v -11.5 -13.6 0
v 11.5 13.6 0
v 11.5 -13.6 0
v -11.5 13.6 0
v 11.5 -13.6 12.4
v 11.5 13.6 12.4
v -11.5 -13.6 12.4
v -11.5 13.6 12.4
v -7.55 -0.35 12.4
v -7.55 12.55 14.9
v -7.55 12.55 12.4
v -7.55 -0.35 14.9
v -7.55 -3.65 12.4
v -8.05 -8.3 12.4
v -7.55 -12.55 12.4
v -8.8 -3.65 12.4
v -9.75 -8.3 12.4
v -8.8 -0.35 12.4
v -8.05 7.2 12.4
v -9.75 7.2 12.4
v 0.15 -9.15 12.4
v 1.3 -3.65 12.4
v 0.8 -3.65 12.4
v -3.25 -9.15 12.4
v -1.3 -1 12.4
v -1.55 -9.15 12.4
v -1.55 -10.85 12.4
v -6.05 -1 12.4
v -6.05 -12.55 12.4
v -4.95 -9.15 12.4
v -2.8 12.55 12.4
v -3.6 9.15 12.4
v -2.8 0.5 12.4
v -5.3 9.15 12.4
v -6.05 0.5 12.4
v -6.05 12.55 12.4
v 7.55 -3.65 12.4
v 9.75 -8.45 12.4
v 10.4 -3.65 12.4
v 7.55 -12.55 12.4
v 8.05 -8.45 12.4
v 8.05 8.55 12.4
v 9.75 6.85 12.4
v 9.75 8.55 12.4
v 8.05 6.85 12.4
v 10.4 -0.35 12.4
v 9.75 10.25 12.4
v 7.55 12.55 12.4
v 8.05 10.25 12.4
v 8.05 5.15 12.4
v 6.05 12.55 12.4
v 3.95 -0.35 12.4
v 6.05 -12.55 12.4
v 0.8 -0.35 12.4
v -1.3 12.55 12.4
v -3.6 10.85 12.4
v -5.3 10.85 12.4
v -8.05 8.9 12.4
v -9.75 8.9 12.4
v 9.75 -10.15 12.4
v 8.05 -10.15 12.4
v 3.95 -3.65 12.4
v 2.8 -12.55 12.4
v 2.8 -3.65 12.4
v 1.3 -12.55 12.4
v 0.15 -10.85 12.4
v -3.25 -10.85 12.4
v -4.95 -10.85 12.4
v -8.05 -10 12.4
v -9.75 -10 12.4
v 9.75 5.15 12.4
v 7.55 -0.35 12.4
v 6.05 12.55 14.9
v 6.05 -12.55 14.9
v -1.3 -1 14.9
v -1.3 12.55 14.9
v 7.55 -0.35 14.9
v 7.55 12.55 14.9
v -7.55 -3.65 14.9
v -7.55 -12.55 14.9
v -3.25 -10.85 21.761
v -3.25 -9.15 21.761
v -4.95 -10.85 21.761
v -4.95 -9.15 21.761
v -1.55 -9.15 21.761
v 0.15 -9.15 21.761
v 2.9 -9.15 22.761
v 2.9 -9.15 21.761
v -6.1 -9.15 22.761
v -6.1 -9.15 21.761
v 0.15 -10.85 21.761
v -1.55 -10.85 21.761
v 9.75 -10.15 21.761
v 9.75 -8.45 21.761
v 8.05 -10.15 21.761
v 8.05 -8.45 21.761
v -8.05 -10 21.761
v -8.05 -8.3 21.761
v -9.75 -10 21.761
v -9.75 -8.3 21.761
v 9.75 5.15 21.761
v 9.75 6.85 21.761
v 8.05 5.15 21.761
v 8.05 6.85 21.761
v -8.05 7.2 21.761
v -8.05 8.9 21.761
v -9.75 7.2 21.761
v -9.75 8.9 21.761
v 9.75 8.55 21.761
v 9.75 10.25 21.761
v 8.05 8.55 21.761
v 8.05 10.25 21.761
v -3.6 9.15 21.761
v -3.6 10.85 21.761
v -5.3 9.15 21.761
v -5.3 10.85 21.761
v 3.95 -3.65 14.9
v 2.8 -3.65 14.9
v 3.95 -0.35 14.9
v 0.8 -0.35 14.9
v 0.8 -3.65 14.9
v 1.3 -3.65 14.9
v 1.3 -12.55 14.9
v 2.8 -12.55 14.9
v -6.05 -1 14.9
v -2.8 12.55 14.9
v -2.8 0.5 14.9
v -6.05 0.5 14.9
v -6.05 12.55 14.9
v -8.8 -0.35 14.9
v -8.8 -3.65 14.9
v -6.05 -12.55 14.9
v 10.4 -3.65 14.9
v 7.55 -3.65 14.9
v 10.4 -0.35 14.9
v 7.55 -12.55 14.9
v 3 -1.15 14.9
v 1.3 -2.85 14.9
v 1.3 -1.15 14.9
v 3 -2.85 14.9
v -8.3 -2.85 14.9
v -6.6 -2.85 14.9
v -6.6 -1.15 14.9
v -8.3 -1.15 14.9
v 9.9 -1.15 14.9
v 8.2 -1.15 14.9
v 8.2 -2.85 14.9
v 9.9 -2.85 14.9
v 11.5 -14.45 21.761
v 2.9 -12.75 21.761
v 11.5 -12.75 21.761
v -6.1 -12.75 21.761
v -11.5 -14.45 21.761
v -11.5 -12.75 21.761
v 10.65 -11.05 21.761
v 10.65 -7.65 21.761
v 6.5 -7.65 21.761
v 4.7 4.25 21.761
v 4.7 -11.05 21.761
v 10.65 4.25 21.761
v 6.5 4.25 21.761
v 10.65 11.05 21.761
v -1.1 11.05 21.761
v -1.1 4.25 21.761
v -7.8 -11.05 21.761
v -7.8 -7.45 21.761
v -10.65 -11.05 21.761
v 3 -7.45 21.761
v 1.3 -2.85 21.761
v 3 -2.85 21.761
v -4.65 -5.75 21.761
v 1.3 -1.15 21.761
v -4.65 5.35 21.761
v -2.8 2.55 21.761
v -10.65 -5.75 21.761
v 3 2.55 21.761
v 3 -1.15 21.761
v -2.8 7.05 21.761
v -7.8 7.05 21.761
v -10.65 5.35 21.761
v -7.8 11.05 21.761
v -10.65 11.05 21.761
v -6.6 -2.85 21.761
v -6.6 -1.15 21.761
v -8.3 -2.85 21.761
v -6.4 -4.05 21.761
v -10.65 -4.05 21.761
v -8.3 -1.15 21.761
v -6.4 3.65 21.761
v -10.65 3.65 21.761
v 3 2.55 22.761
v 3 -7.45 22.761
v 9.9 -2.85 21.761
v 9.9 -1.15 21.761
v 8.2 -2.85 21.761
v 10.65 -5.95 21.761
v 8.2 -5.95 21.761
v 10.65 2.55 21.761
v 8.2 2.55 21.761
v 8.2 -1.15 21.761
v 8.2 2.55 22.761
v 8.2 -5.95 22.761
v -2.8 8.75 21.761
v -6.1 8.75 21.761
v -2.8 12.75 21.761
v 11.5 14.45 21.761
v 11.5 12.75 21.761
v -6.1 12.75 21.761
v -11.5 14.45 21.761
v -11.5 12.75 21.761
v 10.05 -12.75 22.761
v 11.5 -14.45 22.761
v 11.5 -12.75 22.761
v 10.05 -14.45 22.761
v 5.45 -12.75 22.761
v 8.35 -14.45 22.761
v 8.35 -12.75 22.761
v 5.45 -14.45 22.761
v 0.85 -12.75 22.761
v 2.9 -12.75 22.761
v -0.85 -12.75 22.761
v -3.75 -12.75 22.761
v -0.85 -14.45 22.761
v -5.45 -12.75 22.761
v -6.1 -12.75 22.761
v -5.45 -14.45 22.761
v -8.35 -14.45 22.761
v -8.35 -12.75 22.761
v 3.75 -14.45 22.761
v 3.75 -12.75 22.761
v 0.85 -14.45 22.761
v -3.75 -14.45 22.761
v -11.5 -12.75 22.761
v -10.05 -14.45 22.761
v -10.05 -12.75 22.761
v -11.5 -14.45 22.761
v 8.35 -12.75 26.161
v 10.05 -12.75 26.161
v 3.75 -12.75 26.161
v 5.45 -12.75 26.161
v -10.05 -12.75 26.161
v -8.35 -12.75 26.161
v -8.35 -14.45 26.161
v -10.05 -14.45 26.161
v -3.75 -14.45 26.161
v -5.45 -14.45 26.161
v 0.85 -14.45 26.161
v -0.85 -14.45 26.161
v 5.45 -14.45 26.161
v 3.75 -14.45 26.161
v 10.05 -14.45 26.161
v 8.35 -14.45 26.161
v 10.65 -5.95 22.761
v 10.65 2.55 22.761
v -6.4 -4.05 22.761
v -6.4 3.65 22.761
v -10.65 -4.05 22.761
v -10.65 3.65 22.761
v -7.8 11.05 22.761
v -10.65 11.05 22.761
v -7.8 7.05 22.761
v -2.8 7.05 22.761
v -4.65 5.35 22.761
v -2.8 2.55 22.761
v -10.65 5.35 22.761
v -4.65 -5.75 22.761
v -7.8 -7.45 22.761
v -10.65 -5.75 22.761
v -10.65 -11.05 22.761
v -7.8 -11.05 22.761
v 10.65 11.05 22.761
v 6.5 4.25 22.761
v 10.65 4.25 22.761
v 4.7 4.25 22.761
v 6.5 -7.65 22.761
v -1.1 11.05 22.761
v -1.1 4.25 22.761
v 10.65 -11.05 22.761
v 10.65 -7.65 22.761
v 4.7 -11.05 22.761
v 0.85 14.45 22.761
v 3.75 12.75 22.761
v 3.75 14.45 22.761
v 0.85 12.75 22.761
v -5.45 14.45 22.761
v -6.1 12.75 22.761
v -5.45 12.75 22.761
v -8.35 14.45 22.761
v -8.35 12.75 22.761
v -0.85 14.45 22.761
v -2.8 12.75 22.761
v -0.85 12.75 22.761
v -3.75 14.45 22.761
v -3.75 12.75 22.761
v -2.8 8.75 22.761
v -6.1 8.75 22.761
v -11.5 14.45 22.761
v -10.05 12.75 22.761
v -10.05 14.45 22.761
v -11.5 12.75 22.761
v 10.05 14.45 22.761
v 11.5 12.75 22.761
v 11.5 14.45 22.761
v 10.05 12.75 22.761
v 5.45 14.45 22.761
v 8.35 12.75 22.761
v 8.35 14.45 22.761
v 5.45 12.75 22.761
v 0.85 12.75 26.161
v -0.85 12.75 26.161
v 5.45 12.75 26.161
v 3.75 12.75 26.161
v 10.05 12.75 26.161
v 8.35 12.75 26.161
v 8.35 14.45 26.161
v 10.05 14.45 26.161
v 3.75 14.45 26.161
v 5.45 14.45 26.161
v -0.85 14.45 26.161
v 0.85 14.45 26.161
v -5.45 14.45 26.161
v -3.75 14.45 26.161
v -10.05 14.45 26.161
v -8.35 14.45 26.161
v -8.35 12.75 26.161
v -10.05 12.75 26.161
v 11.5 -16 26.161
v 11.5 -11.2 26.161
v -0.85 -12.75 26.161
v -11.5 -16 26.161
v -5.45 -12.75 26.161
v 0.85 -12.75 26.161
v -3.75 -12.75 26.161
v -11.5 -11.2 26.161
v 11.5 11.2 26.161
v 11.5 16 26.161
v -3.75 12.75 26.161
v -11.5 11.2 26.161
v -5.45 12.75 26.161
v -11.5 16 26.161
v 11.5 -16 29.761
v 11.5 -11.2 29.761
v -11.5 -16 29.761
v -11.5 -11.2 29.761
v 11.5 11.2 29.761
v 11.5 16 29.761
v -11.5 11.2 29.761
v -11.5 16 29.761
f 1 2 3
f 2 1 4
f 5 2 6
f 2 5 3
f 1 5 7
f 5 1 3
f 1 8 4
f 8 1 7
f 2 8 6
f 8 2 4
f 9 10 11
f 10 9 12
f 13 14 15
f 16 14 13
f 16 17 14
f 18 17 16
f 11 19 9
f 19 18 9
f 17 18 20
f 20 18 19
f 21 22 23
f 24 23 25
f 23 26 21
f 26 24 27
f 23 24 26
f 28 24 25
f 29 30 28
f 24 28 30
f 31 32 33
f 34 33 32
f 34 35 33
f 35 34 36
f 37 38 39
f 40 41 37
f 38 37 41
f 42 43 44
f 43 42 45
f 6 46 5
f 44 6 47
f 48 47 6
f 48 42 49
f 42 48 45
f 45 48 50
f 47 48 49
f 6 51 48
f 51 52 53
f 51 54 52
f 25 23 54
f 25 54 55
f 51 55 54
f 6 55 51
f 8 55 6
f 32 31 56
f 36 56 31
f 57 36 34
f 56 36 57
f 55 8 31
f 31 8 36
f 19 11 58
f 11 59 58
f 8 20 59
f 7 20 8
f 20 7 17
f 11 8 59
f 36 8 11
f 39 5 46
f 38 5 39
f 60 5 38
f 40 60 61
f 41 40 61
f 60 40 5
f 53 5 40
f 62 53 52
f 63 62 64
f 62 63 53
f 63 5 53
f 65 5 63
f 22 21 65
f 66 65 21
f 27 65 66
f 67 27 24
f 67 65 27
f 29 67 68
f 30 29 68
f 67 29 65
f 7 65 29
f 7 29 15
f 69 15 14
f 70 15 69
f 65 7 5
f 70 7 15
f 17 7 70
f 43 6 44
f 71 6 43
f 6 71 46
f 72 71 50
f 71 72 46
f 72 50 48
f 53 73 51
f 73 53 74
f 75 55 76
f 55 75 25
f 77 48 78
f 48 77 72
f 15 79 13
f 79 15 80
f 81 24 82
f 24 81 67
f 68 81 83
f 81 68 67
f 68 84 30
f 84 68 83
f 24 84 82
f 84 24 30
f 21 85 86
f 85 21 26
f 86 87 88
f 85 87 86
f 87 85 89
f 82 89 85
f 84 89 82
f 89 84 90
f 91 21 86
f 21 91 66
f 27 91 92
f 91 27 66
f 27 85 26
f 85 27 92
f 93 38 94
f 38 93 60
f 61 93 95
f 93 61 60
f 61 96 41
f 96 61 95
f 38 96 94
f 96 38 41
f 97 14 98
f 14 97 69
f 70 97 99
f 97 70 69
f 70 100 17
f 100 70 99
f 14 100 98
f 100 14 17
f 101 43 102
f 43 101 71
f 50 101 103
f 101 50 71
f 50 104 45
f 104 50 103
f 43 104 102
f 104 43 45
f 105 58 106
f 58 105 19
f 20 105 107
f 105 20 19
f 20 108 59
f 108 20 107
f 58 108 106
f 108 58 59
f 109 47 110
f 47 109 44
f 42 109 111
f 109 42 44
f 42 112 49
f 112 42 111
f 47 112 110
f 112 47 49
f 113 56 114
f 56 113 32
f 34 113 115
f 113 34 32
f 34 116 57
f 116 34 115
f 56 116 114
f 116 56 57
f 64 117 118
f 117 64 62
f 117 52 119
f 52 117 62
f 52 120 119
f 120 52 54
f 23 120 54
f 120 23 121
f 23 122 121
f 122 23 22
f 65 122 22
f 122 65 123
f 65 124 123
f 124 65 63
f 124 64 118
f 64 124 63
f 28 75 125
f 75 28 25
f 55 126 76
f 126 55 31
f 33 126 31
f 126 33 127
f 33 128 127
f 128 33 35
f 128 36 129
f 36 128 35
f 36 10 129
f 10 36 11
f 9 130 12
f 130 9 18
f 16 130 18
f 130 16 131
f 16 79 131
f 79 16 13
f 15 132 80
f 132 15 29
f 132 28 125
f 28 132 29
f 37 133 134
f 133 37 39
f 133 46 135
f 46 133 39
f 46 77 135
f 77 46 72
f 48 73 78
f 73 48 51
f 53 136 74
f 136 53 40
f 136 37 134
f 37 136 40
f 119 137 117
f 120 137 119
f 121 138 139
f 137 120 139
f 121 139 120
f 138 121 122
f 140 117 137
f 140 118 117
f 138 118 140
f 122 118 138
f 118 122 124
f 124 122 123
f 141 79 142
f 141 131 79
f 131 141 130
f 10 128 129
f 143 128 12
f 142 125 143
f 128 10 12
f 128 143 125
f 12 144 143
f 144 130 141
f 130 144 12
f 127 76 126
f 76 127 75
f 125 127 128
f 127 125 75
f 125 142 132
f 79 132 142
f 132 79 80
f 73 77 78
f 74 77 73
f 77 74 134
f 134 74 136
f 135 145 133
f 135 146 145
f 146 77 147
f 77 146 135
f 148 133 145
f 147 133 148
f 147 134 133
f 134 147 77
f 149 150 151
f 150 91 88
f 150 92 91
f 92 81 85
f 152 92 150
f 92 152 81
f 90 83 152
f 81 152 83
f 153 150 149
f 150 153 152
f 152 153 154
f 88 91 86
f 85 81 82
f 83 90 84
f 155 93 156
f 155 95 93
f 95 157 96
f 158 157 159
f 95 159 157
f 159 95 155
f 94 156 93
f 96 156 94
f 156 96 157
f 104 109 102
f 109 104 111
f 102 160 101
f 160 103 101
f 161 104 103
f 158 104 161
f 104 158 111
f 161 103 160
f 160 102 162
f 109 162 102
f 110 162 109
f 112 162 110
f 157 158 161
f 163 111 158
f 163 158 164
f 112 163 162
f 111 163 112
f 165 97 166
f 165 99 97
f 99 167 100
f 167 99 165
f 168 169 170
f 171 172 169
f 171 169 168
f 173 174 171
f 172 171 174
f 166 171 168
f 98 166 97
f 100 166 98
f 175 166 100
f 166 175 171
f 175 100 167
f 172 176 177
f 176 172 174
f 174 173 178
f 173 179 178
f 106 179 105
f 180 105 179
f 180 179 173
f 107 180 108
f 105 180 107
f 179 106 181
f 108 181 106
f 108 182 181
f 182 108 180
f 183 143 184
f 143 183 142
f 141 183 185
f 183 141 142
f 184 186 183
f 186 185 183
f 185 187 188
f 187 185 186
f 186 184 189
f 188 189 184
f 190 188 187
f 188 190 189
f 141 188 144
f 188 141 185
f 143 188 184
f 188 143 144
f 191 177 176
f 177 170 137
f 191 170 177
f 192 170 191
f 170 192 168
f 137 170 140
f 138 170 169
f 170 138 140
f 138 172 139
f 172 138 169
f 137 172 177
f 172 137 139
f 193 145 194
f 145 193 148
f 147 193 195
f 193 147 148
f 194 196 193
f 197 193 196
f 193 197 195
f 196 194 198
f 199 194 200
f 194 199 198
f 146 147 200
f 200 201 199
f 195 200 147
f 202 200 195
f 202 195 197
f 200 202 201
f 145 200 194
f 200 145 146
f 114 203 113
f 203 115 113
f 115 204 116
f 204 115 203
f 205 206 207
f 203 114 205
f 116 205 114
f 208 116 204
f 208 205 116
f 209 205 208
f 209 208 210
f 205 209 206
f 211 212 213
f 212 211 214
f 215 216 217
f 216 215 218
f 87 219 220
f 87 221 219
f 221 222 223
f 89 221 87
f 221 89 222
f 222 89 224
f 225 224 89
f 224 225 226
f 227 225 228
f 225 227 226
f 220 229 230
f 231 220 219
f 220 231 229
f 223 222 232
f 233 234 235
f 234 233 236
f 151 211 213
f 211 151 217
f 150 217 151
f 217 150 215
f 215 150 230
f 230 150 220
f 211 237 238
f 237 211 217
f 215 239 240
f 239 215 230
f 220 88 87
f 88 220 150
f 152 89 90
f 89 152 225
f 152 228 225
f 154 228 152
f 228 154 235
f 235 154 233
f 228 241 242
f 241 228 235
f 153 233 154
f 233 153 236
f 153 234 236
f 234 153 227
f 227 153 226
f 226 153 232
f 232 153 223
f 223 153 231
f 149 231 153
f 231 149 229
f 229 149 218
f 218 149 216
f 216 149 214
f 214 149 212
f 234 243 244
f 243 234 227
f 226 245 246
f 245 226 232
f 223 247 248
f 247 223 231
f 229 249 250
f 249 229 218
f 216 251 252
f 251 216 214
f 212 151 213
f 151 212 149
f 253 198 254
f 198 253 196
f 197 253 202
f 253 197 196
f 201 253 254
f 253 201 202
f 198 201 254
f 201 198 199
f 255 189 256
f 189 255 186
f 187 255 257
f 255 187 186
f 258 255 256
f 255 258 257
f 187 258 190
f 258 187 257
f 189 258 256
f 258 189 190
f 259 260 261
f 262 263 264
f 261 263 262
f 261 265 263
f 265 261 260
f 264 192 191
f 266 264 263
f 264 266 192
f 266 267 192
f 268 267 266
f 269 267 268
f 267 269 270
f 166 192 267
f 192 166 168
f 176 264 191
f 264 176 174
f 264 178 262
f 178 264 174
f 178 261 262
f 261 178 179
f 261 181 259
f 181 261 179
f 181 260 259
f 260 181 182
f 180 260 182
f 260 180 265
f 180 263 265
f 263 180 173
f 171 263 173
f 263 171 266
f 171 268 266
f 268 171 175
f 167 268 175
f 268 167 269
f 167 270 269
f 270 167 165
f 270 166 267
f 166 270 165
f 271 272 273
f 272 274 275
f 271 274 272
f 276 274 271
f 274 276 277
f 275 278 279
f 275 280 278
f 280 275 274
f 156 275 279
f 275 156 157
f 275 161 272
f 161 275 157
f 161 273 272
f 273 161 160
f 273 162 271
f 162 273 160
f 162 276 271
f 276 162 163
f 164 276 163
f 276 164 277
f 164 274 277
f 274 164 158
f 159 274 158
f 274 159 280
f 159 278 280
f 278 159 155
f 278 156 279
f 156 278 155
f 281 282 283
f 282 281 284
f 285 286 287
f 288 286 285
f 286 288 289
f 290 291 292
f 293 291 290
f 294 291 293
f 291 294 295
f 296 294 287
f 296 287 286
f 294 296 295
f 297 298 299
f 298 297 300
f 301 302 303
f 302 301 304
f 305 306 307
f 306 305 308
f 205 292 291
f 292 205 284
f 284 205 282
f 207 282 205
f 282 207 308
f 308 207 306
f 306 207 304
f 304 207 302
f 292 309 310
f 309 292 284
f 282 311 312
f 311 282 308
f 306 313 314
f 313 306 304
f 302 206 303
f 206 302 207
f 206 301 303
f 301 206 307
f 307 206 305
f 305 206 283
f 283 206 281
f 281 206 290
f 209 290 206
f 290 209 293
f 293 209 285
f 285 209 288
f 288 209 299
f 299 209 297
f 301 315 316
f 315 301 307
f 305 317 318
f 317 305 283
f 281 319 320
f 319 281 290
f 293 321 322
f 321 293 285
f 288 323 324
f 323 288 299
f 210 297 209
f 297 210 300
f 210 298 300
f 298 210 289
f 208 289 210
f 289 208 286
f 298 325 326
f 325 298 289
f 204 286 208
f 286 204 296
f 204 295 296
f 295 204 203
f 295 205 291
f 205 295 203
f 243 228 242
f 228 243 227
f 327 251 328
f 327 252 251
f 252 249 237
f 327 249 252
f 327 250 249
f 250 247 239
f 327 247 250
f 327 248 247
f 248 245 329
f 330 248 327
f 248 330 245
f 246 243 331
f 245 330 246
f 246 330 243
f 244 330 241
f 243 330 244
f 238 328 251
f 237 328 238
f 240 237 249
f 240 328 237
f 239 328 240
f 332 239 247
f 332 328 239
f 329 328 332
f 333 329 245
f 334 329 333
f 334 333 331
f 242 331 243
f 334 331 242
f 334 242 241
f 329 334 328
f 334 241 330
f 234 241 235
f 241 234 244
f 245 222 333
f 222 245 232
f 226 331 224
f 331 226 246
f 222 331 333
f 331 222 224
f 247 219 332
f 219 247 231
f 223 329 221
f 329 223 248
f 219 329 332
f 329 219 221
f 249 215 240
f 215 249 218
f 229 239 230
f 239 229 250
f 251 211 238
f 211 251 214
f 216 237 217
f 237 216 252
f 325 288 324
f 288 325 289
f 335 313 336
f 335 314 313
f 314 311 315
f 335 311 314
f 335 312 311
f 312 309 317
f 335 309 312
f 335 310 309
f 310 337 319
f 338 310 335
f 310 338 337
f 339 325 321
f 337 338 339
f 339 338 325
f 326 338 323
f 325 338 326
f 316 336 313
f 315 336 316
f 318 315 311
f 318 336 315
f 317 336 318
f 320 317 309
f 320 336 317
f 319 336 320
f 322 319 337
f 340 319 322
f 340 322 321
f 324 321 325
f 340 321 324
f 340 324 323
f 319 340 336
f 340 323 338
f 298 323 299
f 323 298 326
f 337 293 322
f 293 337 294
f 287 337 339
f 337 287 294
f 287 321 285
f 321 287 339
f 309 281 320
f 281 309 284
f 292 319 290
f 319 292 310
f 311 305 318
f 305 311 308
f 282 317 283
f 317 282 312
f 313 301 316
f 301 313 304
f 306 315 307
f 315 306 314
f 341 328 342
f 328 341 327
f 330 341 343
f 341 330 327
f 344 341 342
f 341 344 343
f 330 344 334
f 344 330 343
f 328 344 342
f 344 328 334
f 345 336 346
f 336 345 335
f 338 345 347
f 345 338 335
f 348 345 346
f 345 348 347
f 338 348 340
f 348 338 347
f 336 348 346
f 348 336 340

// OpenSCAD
// Generated by SolidPython 0.4.2 on 2020-09-29 23:20:49
//!OpenSCAD

scale(v = 0.0100000000) {
	translate(v = [-1150, -1360, 0]) {
		union() {
			color(c = [0.4000000000, 0.4000000000, 0.4000000000]) {
				translate(v = [0, 0, 0]) {
					linear_extrude(height = 1000.0000000000) {
						polygon(paths = [[0, 1, 2, 3]], points = [[0, 0], [0, 2720], [2300, 2720], [2300, 0]]);
					}
				}
			}
			color(c = [0.2000000000, 0.6000000000, 0.2000000000]) {
				translate(v = [0, 0, 1000.0000000000]) {
					linear_extrude(height = 120.0000000000) {
						polygon(paths = [[0, 1, 2, 3]], points = [[0, 1305], [0, 2720], [2300, 2720], [2300, 1305]]);
					}
				}
			}
			color(c = [0.4000000000, 0.4000000000, 0.4000000000]) {
				translate(v = [0, 0, 1000.0000000000]) {
					linear_extrude(height = 120.0000000000) {
						polygon(paths = [[0, 1, 2, 3]], points = [[0, 0], [0, 1305], [2300, 1305], [2300, 0]]);
					}
				}
			}
			color(c = [0.9000000000, 0.6000000000, 0.6000000000]) {
				translate(v = [0, 0, 1120.0000000000]) {
					linear_extrude(height = 120.0000000000) {
						polygon(paths = [[0, 1, 2, 3]], points = [[135, 1845], [135, 2485], [395, 2485], [395, 1845]]);
					}
				}
			}
			color(c = [0.9000000000, 0.6000000000, 0.6000000000]) {
				translate(v = [0, 0, 1120.0000000000]) {
					linear_extrude(height = 120.0000000000) {
						polygon(paths = [[0, 1, 2, 3, 4, 5]], points = [[620, 1485], [620, 1845], [545, 1845], [545, 2485], [870, 2485], [870, 1485]]);
					}
				}
			}
			color(c = [0.9000000000, 0.6000000000, 0.6000000000]) {
				translate(v = [0, 0, 1120.0000000000]) {
					linear_extrude(height = 120.0000000000) {
						polygon(paths = [[0, 1, 2, 3]], points = [[1020, 1485], [1020, 2485], [1755, 2485], [1755, 1485]]);
					}
				}
			}
			color(c = [0.9000000000, 0.6000000000, 0.6000000000]) {
				translate(v = [0, 0, 1120.0000000000]) {
					linear_extrude(height = 120.0000000000) {
						polygon(paths = [[0, 1, 2, 3]], points = [[1905, 1485], [1905, 2485], [2165, 2485], [2165, 1485]]);
					}
				}
			}
			color(c = [0.9000000000, 0.6000000000, 0.9000000000]) {
				translate(v = [0, 0, 1120.0000000000]) {
					linear_extrude(height = 120.0000000000) {
						polygon(paths = [[0, 1, 2, 3]], points = [[135, 235], [135, 655], [395, 655], [395, 235]]);
					}
				}
			}
			color(c = [0.9000000000, 0.6000000000, 0.9000000000]) {
				translate(v = [0, 0, 1120.0000000000]) {
					linear_extrude(height = 120.0000000000) {
						polygon(paths = [[0, 1, 2, 3, 4, 5]], points = [[545, 235], [545, 655], [620, 655], [620, 885], [1280, 885], [1280, 235]]);
					}
				}
			}
			color(c = [0.9000000000, 0.6000000000, 0.9000000000]) {
				translate(v = [0, 0, 1120.0000000000]) {
					linear_extrude(height = 120.0000000000) {
						polygon(paths = [[0, 1, 2, 3]], points = [[1430, 235], [1430, 885], [1755, 885], [1755, 235]]);
					}
				}
			}
			color(c = [0.9000000000, 0.6000000000, 0.9000000000]) {
				translate(v = [0, 0, 1120.0000000000]) {
					linear_extrude(height = 120.0000000000) {
						polygon(paths = [[0, 1, 2, 3]], points = [[1905, 235], [1905, 885], [2165, 885], [2165, 235]]);
					}
				}
			}
			color(c = [0.2000000000, 0.6000000000, 0.2000000000]) {
				translate(v = [0, 0, 1120.0000000000]) {
					linear_extrude(height = 120.0000000000) {
						difference() {
							polygon(paths = [[0, 1, 2, 3]], points = [[0, 1305], [0, 2720], [2300, 2720], [2300, 1305]]);
							polygon(paths = [[0, 1, 2, 3]], points = [[1020, 1485], [1755, 1485], [1755, 2485], [1020, 2485]]);
							polygon(paths = [[0, 1, 2, 3]], points = [[1905, 1485], [2165, 1485], [2165, 2485], [1905, 2485]]);
							polygon(paths = [[0, 1, 2, 3]], points = [[135, 1845], [395, 1845], [395, 2485], [135, 2485]]);
							polygon(paths = [[0, 1, 2, 3, 4, 5]], points = [[620, 1485], [870, 1485], [870, 2485], [545, 2485], [545, 1845], [620, 1845]]);
						}
					}
				}
			}
			color(c = [0.4000000000, 0.4000000000, 0.4000000000]) {
				translate(v = [0, 0, 1120.0000000000]) {
					linear_extrude(height = 120.0000000000) {
						difference() {
							polygon(paths = [[0, 1, 2, 3]], points = [[0, 0], [0, 1305], [2300, 1305], [2300, 0]]);
							polygon(paths = [[0, 1, 2, 3]], points = [[135, 235], [395, 235], [395, 655], [135, 655]]);
							polygon(paths = [[0, 1, 2, 3]], points = [[1430, 235], [1755, 235], [1755, 885], [1430, 885]]);
							polygon(paths = [[0, 1, 2, 3]], points = [[1905, 235], [2165, 235], [2165, 885], [1905, 885]]);
							polygon(paths = [[0, 1, 2, 3, 4, 5]], points = [[545, 235], [1280, 235], [1280, 885], [620, 885], [620, 655], [545, 655]]);
						}
					}
				}
			}
			color(c = [0.1000000000, 0.1000000000, 0.1000000000]) {
				translate(v = [0, 0, 1240.0000000000]) {
					linear_extrude(height = 70.0000000000) {
						polygon(paths = [[0, 1, 2, 3]], points = [[655, 275], [655, 445], [825, 445], [825, 275]]);
					}
				}
			}
			color(c = [0.1000000000, 0.1000000000, 0.1000000000]) {
				translate(v = [0, 0, 1240.0000000000]) {
					linear_extrude(height = 70.0000000000) {
						polygon(paths = [[0, 1, 2, 3]], points = [[995, 275], [995, 445], [1165, 445], [1165, 275]]);
					}
				}
			}
			color(c = [0.1000000000, 0.1000000000, 0.1000000000]) {
				translate(v = [0, 0, 1240.0000000000]) {
					linear_extrude(height = 70.0000000000) {
						polygon(paths = [[0, 1, 2, 3]], points = [[1955, 345], [1955, 515], [2125, 515], [2125, 345]]);
					}
				}
			}
			color(c = [0.1000000000, 0.1000000000, 0.1000000000]) {
				translate(v = [0, 0, 1240.0000000000]) {
					linear_extrude(height = 70.0000000000) {
						polygon(paths = [[0, 1, 2, 3]], points = [[175, 360], [175, 530], [345, 530], [345, 360]]);
					}
				}
			}
			color(c = [0.1000000000, 0.1000000000, 0.1000000000]) {
				translate(v = [0, 0, 1240.0000000000]) {
					linear_extrude(height = 70.0000000000) {
						polygon(paths = [[0, 1, 2, 3]], points = [[1955, 1875], [1955, 2045], [2125, 2045], [2125, 1875]]);
					}
				}
			}
			color(c = [0.1000000000, 0.1000000000, 0.1000000000]) {
				translate(v = [0, 0, 1240.0000000000]) {
					linear_extrude(height = 70.0000000000) {
						polygon(paths = [[0, 1, 2, 3]], points = [[175, 2080], [175, 2250], [345, 2250], [345, 2080]]);
					}
				}
			}
			color(c = [0.1000000000, 0.1000000000, 0.1000000000]) {
				translate(v = [0, 0, 1240.0000000000]) {
					linear_extrude(height = 70.0000000000) {
						polygon(paths = [[0, 1, 2, 3]], points = [[1955, 2215], [1955, 2385], [2125, 2385], [2125, 2215]]);
					}
				}
			}
			color(c = [0.1000000000, 0.1000000000, 0.1000000000]) {
				translate(v = [0, 0, 1240.0000000000]) {
					linear_extrude(height = 70.0000000000) {
						polygon(paths = [[0, 1, 2, 3]], points = [[620, 2275], [620, 2445], [790, 2445], [790, 2275]]);
					}
				}
			}
			color(c = [1.0000000000, 1.0000000000, 1.0000000000]) {
				translate(v = [0, 0, 1240.0000000000]) {
					linear_extrude(height = 70.0000000000) {
						polygon(paths = [[0, 1, 2, 3, 4, 5, 6, 7]], points = [[1280, 105], [1280, 995], [1230, 995], [1230, 1325], [1545, 1325], [1545, 995], [1430, 995], [1430, 105]]);
					}
				}
			}
			color(c = [1.0000000000, 1.0000000000, 1.0000000000]) {
				translate(v = [0, 0, 1240.0000000000]) {
					linear_extrude(height = 70.0000000000) {
						polygon(paths = [[0, 1, 2, 3, 4, 5, 6, 7, 8, 9, 10, 11, 12, 13]], points = [[395, 105], [395, 995], [270, 995], [270, 1325], [395, 1325], [395, 2615], [545, 2615], [545, 1410], [870, 1410], [870, 2615], [1020, 2615], [1020, 1260], [545, 1260], [545, 105]]);
					}
				}
			}
			color(c = [1.0000000000, 1.0000000000, 1.0000000000]) {
				translate(v = [0, 0, 1240.0000000000]) {
					linear_extrude(height = 70.0000000000) {
						polygon(paths = [[0, 1, 2, 3, 4, 5, 6, 7]], points = [[1755, 105], [1755, 2615], [1905, 2615], [1905, 1325], [2190, 1325], [2190, 995], [1905, 995], [1905, 105]]);
					}
				}
			}
			color(c = [0.1000000000, 0.1000000000, 0.1000000000]) {
				translate(v = [0, 0, 1310.0000000000]) {
					linear_extrude(height = 180.0000000000) {
						polygon(paths = [[0, 1, 2, 3]], points = [[655, 275], [655, 445], [825, 445], [825, 275]]);
					}
				}
			}
			color(c = [0.1000000000, 0.1000000000, 0.1000000000]) {
				translate(v = [0, 0, 1310.0000000000]) {
					linear_extrude(height = 180.0000000000) {
						polygon(paths = [[0, 1, 2, 3]], points = [[995, 275], [995, 445], [1165, 445], [1165, 275]]);
					}
				}
			}
			color(c = [0.1000000000, 0.1000000000, 0.1000000000]) {
				translate(v = [0, 0, 1310.0000000000]) {
					linear_extrude(height = 180.0000000000) {
						polygon(paths = [[0, 1, 2, 3]], points = [[1955, 345], [1955, 515], [2125, 515], [2125, 345]]);
					}
				}
			}
			color(c = [0.1000000000, 0.1000000000, 0.1000000000]) {
				translate(v = [0, 0, 1310.0000000000]) {
					linear_extrude(height = 180.0000000000) {
						polygon(paths = [[0, 1, 2, 3]], points = [[175, 360], [175, 530], [345, 530], [345, 360]]);
					}
				}
			}
			color(c = [0.1000000000, 0.1000000000, 0.1000000000]) {
				translate(v = [0, 0, 1310.0000000000]) {
					linear_extrude(height = 180.0000000000) {
						polygon(paths = [[0, 1, 2, 3]], points = [[1955, 1875], [1955, 2045], [2125, 2045], [2125, 1875]]);
					}
				}
			}
			color(c = [0.1000000000, 0.1000000000, 0.1000000000]) {
				translate(v = [0, 0, 1310.0000000000]) {
					linear_extrude(height = 180.0000000000) {
						polygon(paths = [[0, 1, 2, 3]], points = [[175, 2080], [175, 2250], [345, 2250], [345, 2080]]);
					}
				}
			}
			color(c = [0.1000000000, 0.1000000000, 0.1000000000]) {
				translate(v = [0, 0, 1310.0000000000]) {
					linear_extrude(height = 180.0000000000) {
						polygon(paths = [[0, 1, 2, 3]], points = [[1955, 2215], [1955, 2385], [2125, 2385], [2125, 2215]]);
					}
				}
			}
			color(c = [0.1000000000, 0.1000000000, 0.1000000000]) {
				translate(v = [0, 0, 1310.0000000000]) {
					linear_extrude(height = 180.0000000000) {
						polygon(paths = [[0, 1, 2, 3]], points = [[620, 2275], [620, 2445], [790, 2445], [790, 2275]]);
					}
				}
			}
			color(c = [0.7000000000, 0, 0]) {
				translate(v = [0, 0, 1310.0000000000]) {
					linear_extrude(height = 180.0000000000) {
						polygon(paths = [[0, 1, 2, 3, 4, 5, 6, 7]], points = [[1280, 105], [1280, 995], [1230, 995], [1230, 1325], [1545, 1325], [1545, 995], [1430, 995], [1430, 105]]);
					}
				}
			}
			color(c = [0.7000000000, 0, 0]) {
				translate(v = [0, 0, 1310.0000000000]) {
					linear_extrude(height = 180.0000000000) {
						polygon(paths = [[0, 1, 2, 3, 4, 5, 6, 7, 8, 9, 10, 11, 12, 13]], points = [[395, 105], [395, 995], [270, 995], [270, 1325], [395, 1325], [395, 2615], [545, 2615], [545, 1410], [870, 1410], [870, 2615], [1020, 2615], [1020, 1260], [545, 1260], [545, 105]]);
					}
				}
			}
			color(c = [0.7000000000, 0, 0]) {
				translate(v = [0, 0, 1310.0000000000]) {
					linear_extrude(height = 180.0000000000) {
						polygon(paths = [[0, 1, 2, 3, 4, 5, 6, 7]], points = [[1755, 105], [1755, 2615], [1905, 2615], [1905, 1325], [2190, 1325], [2190, 995], [1905, 995], [1905, 105]]);
					}
				}
			}
			color(c = [0.1000000000, 0.1000000000, 0.1000000000]) {
				translate(v = [0, 0, 1490.0000000000]) {
					linear_extrude(height = 686.1000000000) {
						polygon(paths = [[0, 1, 2, 3]], points = [[655, 275], [655, 445], [825, 445], [825, 275]]);
					}
				}
			}
			color(c = [0.1000000000, 0.1000000000, 0.1000000000]) {
				translate(v = [0, 0, 1490.0000000000]) {
					linear_extrude(height = 686.1000000000) {
						polygon(paths = [[0, 1, 2, 3]], points = [[995, 275], [995, 445], [1165, 445], [1165, 275]]);
					}
				}
			}
			color(c = [0.1000000000, 0.1000000000, 0.1000000000]) {
				translate(v = [0, 0, 1490.0000000000]) {
					linear_extrude(height = 686.1000000000) {
						polygon(paths = [[0, 1, 2, 3]], points = [[1955, 345], [1955, 515], [2125, 515], [2125, 345]]);
					}
				}
			}
			color(c = [0.1000000000, 0.1000000000, 0.1000000000]) {
				translate(v = [0, 0, 1490.0000000000]) {
					linear_extrude(height = 686.1000000000) {
						polygon(paths = [[0, 1, 2, 3]], points = [[175, 360], [175, 530], [345, 530], [345, 360]]);
					}
				}
			}
			color(c = [0.1000000000, 0.1000000000, 0.1000000000]) {
				translate(v = [0, 0, 1490.0000000000]) {
					linear_extrude(height = 686.1000000000) {
						polygon(paths = [[0, 1, 2, 3]], points = [[320, 1075], [320, 1245], [490, 1245], [490, 1075]]);
					}
				}
			}
			color(c = [0.1000000000, 0.1000000000, 0.1000000000]) {
				translate(v = [0, 0, 1490.0000000000]) {
					linear_extrude(height = 686.1000000000) {
						polygon(paths = [[0, 1, 2, 3]], points = [[1280, 1075], [1280, 1245], [1450, 1245], [1450, 1075]]);
					}
				}
			}
			color(c = [0.1000000000, 0.1000000000, 0.1000000000]) {
				translate(v = [0, 0, 1490.0000000000]) {
					linear_extrude(height = 686.1000000000) {
						polygon(paths = [[0, 1, 2, 3]], points = [[1970, 1075], [1970, 1245], [2140, 1245], [2140, 1075]]);
					}
				}
			}
			color(c = [0.1000000000, 0.1000000000, 0.1000000000]) {
				translate(v = [0, 0, 1490.0000000000]) {
					linear_extrude(height = 686.1000000000) {
						polygon(paths = [[0, 1, 2, 3]], points = [[1955, 1875], [1955, 2045], [2125, 2045], [2125, 1875]]);
					}
				}
			}
			color(c = [0.1000000000, 0.1000000000, 0.1000000000]) {
				translate(v = [0, 0, 1490.0000000000]) {
					linear_extrude(height = 686.1000000000) {
						polygon(paths = [[0, 1, 2, 3]], points = [[175, 2080], [175, 2250], [345, 2250], [345, 2080]]);
					}
				}
			}
			color(c = [0.1000000000, 0.1000000000, 0.1000000000]) {
				translate(v = [0, 0, 1490.0000000000]) {
					linear_extrude(height = 686.1000000000) {
						polygon(paths = [[0, 1, 2, 3]], points = [[1955, 2215], [1955, 2385], [2125, 2385], [2125, 2215]]);
					}
				}
			}
			color(c = [0.1000000000, 0.1000000000, 0.1000000000]) {
				translate(v = [0, 0, 1490.0000000000]) {
					linear_extrude(height = 686.1000000000) {
						polygon(paths = [[0, 1, 2, 3]], points = [[620, 2275], [620, 2445], [790, 2445], [790, 2275]]);
					}
				}
			}
			color(c = [0.9000000000, 0.6000000000, 0.6000000000]) {
				translate(v = [0, 0, 2176.1000000000]) {
					linear_extrude(height = 100.0000000000) {
						polygon(paths = [[0, 1, 2, 3, 4, 5, 6, 7]], points = [[0, -85], [0, 85], [540, 85], [540, 445], [1440, 445], [1440, 85], [2300, 85], [2300, -85]]);
					}
				}
			}
			color(c = [0.9000000000, 0.6000000000, 0.6000000000]) {
				translate(v = [0, 0, 2176.1000000000]) {
					linear_extrude(height = 100.0000000000) {
						polygon(paths = [[0, 1, 2, 3]], points = [[1970, 765], [1970, 1615], [2215, 1615], [2215, 765]]);
					}
				}
			}
			color(c = [0.9000000000, 0.6000000000, 0.6000000000]) {
				translate(v = [0, 0, 2176.1000000000]) {
					linear_extrude(height = 100.0000000000) {
						polygon(paths = [[0, 1, 2, 3]], points = [[85, 955], [85, 1725], [510, 1725], [510, 955]]);
					}
				}
			}
			color(c = [0.9000000000, 0.6000000000, 0.6000000000]) {
				translate(v = [0, 0, 2176.1000000000]) {
					linear_extrude(height = 100.0000000000) {
						polygon(paths = [[0, 1, 2, 3, 4, 5, 6, 7, 8, 9, 10, 11, 12, 13]], points = [[85, 255], [85, 785], [685, 785], [685, 1895], [85, 1895], [85, 2465], [370, 2465], [370, 2065], [870, 2065], [870, 1615], [1450, 1615], [1450, 615], [370, 615], [370, 255]]);
					}
				}
			}
			color(c = [0.9000000000, 0.6000000000, 0.6000000000]) {
				translate(v = [0, 0, 2176.1000000000]) {
					linear_extrude(height = 100.0000000000) {
						polygon(paths = [[0, 1, 2, 3, 4, 5, 6, 7, 8, 9]], points = [[1620, 255], [1620, 1785], [1040, 1785], [1040, 2465], [2215, 2465], [2215, 1785], [1800, 1785], [1800, 595], [2215, 595], [2215, 255]]);
					}
				}
			}
			color(c = [0.9000000000, 0.6000000000, 0.6000000000]) {
				translate(v = [0, 0, 2176.1000000000]) {
					linear_extrude(height = 100.0000000000) {
						polygon(paths = [[0, 1, 2, 3, 4, 5, 6, 7]], points = [[540, 2235], [540, 2635], [0, 2635], [0, 2805], [2300, 2805], [2300, 2635], [870, 2635], [870, 2235]]);
					}
				}
			}
			color(c = [0.5000000000, 0.5000000000, 0.5000000000]) {
				translate(v = [0, 0, 2276.1000000000]) {
					linear_extrude(height = 340.0000000000) {
						polygon(paths = [[0, 1, 2, 3]], points = [[145, -85], [145, 85], [315, 85], [315, -85]]);
					}
				}
			}
			color(c = [0.5000000000, 0.5000000000, 0.5000000000]) {
				translate(v = [0, 0, 2276.1000000000]) {
					linear_extrude(height = 340.0000000000) {
						polygon(paths = [[0, 1, 2, 3]], points = [[605, -85], [605, 85], [775, 85], [775, -85]]);
					}
				}
			}
			color(c = [0.5000000000, 0.5000000000, 0.5000000000]) {
				translate(v = [0, 0, 2276.1000000000]) {
					linear_extrude(height = 340.0000000000) {
						polygon(paths = [[0, 1, 2, 3]], points = [[1065, -85], [1065, 85], [1235, 85], [1235, -85]]);
					}
				}
			}
			color(c = [0.5000000000, 0.5000000000, 0.5000000000]) {
				translate(v = [0, 0, 2276.1000000000]) {
					linear_extrude(height = 340.0000000000) {
						polygon(paths = [[0, 1, 2, 3]], points = [[1525, -85], [1525, 85], [1695, 85], [1695, -85]]);
					}
				}
			}
			color(c = [0.5000000000, 0.5000000000, 0.5000000000]) {
				translate(v = [0, 0, 2276.1000000000]) {
					linear_extrude(height = 340.0000000000) {
						polygon(paths = [[0, 1, 2, 3]], points = [[1985, -85], [1985, 85], [2155, 85], [2155, -85]]);
					}
				}
			}
			color(c = [0.5000000000, 0.5000000000, 0.5000000000]) {
				translate(v = [0, 0, 2276.1000000000]) {
					linear_extrude(height = 340.0000000000) {
						polygon(paths = [[0, 1, 2, 3]], points = [[145, 2635], [145, 2805], [315, 2805], [315, 2635]]);
					}
				}
			}
			color(c = [0.5000000000, 0.5000000000, 0.5000000000]) {
				translate(v = [0, 0, 2276.1000000000]) {
					linear_extrude(height = 340.0000000000) {
						polygon(paths = [[0, 1, 2, 3]], points = [[605, 2635], [605, 2805], [775, 2805], [775, 2635]]);
					}
				}
			}
			color(c = [0.5000000000, 0.5000000000, 0.5000000000]) {
				translate(v = [0, 0, 2276.1000000000]) {
					linear_extrude(height = 340.0000000000) {
						polygon(paths = [[0, 1, 2, 3]], points = [[1065, 2635], [1065, 2805], [1235, 2805], [1235, 2635]]);
					}
				}
			}
			color(c = [0.5000000000, 0.5000000000, 0.5000000000]) {
				translate(v = [0, 0, 2276.1000000000]) {
					linear_extrude(height = 340.0000000000) {
						polygon(paths = [[0, 1, 2, 3]], points = [[1525, 2635], [1525, 2805], [1695, 2805], [1695, 2635]]);
					}
				}
			}
			color(c = [0.5000000000, 0.5000000000, 0.5000000000]) {
				translate(v = [0, 0, 2276.1000000000]) {
					linear_extrude(height = 340.0000000000) {
						polygon(paths = [[0, 1, 2, 3]], points = [[1985, 2635], [1985, 2805], [2155, 2805], [2155, 2635]]);
					}
				}
			}
			color(c = [0.3000000000, 0.3000000000, 1]) {
				translate(v = [0, 0, 2616.1000000000]) {
					linear_extrude(height = 360.0000000000) {
						polygon(paths = [[0, 1, 2, 3]], points = [[0, -240], [0, 240], [2300, 240], [2300, -240]]);
					}
				}
			}
			color(c = [0.3000000000, 0.3000000000, 1]) {
				translate(v = [0, 0, 2616.1000000000]) {
					linear_extrude(height = 360.0000000000) {
						polygon(paths = [[0, 1, 2, 3]], points = [[0, 2480], [0, 2960], [2300, 2960], [2300, 2480]]);
					}
				}
			}
		}
	}
}
